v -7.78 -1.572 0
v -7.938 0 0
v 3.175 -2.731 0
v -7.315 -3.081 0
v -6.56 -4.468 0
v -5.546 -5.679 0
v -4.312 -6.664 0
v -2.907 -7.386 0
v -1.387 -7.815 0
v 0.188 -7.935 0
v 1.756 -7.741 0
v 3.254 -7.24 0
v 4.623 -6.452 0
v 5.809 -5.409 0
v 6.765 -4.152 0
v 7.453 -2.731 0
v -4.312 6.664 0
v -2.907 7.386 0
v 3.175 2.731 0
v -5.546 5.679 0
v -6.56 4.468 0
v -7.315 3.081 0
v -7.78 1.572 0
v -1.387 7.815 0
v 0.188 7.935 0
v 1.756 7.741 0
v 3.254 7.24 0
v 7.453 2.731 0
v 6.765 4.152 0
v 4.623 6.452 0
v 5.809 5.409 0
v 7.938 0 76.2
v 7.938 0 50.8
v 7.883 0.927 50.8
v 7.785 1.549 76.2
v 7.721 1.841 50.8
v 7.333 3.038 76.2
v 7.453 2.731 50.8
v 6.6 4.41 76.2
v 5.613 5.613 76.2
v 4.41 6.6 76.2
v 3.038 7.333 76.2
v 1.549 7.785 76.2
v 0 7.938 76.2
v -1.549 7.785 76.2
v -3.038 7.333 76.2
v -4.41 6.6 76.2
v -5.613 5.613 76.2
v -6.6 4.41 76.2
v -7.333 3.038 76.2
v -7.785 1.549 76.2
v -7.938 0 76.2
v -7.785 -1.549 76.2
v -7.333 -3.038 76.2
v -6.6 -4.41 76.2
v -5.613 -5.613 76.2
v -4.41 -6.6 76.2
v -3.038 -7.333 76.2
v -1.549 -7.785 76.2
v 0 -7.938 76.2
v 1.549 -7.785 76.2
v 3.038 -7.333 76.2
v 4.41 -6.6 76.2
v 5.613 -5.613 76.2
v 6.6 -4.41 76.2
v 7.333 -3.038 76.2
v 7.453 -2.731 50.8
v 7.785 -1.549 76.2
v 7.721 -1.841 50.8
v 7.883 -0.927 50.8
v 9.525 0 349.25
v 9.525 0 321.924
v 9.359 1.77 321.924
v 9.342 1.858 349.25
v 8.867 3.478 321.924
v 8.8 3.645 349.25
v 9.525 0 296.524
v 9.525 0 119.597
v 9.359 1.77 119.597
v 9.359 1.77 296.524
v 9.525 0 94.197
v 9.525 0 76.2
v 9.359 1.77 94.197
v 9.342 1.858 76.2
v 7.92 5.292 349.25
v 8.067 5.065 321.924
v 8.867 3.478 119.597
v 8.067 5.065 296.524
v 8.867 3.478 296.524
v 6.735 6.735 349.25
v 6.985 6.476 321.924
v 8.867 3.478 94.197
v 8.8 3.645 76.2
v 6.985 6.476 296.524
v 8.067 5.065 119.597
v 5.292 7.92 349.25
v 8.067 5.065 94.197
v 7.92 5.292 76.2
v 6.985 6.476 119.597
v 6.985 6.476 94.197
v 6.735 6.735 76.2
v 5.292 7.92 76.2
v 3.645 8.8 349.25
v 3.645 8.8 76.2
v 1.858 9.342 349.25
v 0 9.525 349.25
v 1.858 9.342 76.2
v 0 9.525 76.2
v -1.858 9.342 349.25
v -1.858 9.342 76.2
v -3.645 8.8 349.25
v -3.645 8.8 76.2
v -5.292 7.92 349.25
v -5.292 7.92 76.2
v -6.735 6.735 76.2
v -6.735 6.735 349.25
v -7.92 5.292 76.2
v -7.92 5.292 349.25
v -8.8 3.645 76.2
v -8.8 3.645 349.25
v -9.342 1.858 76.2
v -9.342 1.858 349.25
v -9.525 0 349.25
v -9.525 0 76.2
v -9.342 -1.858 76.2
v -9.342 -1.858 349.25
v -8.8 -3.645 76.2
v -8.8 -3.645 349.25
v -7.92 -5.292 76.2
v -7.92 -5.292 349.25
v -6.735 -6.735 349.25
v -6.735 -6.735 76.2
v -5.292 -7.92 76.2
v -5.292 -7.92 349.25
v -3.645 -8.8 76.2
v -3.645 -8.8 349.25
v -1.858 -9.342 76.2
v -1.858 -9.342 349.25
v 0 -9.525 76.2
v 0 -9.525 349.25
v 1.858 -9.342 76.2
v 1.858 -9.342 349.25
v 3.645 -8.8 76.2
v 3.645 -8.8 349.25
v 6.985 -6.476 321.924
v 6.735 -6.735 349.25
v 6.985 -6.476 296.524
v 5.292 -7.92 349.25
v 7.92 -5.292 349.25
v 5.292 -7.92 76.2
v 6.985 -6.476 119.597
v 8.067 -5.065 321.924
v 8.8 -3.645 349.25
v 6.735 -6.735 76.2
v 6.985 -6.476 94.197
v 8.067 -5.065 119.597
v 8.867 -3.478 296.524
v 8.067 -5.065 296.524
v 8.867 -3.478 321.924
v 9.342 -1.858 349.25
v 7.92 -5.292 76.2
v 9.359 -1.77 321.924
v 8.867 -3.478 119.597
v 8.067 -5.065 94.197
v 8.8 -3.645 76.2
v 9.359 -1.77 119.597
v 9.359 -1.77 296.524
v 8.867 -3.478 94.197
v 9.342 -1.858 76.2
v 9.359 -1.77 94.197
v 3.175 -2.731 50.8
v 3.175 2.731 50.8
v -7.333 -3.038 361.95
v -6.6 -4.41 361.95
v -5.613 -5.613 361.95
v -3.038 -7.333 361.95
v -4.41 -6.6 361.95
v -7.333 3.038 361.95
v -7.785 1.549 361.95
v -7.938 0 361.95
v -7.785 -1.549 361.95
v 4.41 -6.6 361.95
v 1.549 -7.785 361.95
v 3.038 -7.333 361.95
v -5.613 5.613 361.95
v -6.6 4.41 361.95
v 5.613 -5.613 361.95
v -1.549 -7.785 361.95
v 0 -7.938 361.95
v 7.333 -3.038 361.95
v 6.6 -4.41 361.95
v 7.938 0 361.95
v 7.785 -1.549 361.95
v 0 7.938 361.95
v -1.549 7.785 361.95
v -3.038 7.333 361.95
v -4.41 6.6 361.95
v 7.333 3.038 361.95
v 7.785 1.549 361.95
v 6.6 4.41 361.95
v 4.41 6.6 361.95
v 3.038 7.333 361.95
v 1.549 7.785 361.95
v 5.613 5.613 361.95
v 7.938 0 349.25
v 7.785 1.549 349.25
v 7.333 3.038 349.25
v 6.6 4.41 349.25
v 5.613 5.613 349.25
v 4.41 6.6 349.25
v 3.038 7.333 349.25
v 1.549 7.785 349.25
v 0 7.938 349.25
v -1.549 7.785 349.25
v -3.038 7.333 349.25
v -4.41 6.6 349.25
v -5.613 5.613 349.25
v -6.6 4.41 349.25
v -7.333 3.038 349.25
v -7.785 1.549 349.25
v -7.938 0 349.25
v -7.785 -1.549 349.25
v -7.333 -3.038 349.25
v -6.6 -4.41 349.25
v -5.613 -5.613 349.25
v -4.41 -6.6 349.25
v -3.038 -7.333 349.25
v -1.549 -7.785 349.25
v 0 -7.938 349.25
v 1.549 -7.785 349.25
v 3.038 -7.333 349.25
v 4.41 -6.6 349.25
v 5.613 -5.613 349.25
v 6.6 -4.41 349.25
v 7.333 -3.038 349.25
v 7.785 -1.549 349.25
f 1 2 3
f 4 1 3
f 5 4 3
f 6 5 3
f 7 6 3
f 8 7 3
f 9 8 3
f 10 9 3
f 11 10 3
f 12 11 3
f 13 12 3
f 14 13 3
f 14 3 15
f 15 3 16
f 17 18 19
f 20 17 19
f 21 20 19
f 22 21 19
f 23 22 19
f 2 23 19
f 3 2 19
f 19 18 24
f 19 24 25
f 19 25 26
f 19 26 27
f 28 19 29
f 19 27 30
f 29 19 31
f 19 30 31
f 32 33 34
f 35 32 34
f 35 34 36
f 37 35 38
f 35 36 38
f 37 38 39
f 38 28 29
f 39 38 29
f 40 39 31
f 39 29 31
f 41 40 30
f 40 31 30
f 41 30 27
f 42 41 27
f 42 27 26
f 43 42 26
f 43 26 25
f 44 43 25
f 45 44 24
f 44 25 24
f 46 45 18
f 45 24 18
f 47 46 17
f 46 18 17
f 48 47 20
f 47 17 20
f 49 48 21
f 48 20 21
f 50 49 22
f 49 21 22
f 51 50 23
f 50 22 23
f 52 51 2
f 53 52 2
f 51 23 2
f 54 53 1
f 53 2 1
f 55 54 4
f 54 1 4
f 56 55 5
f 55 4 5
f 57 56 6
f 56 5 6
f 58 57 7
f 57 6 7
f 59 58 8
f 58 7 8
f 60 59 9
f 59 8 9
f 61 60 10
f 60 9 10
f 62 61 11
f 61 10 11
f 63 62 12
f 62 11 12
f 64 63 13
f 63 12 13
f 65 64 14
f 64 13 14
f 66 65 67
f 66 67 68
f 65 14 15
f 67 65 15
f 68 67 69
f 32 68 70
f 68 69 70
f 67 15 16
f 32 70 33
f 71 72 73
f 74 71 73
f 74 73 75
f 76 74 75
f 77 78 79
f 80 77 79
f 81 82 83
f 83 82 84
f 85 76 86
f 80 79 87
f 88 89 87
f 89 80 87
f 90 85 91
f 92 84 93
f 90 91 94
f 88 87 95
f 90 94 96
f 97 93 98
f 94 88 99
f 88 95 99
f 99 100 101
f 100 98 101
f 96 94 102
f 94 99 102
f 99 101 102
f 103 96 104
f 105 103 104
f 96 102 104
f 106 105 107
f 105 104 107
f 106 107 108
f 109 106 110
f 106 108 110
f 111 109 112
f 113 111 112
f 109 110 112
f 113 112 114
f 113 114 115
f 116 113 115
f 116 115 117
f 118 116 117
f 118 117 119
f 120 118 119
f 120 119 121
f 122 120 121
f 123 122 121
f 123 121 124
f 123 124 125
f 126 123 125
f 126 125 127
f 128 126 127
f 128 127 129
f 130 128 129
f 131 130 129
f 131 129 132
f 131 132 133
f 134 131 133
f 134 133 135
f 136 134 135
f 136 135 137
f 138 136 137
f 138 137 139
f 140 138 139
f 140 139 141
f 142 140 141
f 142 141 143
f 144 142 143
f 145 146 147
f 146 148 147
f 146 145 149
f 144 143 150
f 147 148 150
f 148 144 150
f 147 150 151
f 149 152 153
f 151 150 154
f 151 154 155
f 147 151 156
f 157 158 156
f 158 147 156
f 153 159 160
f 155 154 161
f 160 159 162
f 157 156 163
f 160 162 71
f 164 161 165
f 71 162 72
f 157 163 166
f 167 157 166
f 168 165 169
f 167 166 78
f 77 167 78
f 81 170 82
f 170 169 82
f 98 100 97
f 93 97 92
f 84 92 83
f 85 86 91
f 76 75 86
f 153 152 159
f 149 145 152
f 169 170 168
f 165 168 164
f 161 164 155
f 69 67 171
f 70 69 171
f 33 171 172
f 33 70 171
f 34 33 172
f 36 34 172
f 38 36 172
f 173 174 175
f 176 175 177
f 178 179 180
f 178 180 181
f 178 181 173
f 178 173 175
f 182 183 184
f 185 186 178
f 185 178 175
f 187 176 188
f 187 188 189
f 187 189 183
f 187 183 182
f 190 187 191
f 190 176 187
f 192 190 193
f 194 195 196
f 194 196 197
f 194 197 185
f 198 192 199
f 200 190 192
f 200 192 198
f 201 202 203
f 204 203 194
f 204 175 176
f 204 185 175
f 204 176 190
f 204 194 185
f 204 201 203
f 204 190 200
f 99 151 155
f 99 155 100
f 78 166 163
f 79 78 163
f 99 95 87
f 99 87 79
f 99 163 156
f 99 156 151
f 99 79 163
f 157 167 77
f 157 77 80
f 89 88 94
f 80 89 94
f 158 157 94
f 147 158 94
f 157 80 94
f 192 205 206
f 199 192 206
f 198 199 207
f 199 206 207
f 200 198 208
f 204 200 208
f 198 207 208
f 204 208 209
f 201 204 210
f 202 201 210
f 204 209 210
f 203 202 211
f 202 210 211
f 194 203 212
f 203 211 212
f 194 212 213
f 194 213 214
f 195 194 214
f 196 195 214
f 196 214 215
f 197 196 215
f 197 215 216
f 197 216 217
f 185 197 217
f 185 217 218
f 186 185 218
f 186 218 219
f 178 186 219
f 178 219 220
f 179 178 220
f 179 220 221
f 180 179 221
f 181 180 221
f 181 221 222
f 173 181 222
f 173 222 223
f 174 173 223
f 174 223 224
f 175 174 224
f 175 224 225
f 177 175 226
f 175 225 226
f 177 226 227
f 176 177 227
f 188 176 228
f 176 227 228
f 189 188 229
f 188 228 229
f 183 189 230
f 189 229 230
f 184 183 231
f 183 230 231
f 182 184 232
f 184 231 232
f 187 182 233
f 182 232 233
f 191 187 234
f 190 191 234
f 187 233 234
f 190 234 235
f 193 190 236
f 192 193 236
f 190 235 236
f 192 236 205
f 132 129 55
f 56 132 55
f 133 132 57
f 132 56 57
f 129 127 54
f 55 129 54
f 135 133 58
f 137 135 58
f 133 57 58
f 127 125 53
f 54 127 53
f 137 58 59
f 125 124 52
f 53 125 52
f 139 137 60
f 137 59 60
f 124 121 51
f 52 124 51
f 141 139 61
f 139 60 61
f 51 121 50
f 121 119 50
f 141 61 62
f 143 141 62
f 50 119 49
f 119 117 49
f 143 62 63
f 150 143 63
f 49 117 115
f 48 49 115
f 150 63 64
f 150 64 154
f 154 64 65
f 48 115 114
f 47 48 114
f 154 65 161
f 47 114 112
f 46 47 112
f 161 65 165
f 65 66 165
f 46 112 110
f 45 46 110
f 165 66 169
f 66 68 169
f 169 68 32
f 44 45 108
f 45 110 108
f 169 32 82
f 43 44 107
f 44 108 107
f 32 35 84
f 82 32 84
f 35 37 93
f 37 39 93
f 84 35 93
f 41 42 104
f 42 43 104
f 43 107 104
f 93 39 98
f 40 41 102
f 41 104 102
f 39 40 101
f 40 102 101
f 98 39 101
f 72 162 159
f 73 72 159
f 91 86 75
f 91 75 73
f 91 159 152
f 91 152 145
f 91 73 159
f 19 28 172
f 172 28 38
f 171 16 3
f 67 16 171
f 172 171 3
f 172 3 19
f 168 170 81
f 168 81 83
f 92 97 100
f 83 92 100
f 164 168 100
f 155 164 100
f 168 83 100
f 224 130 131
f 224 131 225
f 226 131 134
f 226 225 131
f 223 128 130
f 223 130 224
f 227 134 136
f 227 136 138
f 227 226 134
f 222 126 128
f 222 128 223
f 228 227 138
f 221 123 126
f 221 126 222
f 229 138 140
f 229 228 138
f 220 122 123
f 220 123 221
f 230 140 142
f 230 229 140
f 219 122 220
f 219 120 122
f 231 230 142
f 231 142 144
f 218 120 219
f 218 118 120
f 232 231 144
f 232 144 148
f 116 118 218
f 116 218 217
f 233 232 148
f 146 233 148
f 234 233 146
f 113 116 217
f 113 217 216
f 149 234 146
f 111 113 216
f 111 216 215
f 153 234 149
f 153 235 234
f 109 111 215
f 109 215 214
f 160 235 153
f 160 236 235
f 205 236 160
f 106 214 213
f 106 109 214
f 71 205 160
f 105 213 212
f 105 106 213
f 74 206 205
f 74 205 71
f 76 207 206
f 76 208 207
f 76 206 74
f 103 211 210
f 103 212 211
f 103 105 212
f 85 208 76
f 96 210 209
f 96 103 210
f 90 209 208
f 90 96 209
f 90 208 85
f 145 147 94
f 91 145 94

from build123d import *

# Parameters (mm, degrees)
F0_R     = 7.9375
F1_DEPTH = 361.95
F0_R_2   = 9.525
F2_DEPTH = 349.25
F3_DEPTH = 76.2
F5_W     = 5.461208
F5_H     = 50.8
F6_DEPTH = 4.7625
F8_W     = 25.4
F8_H     = 25.4
F9_DEPTH = 2.54


with BuildPart() as f1:
    # F0 (on Top) → F1 (new body)
    with BuildSketch(Plane.XY):
        Circle(F0_R)
    extrude(amount=F1_DEPTH)

    # F0 (on Top) → F2 (join)
    with BuildSketch(Plane.XY):
        Circle(F0_R_2)
        Circle(F0_R, mode=Mode.SUBTRACT)
    extrude(amount=F2_DEPTH)

    # F0 (on Top) → F3 (cut)
    with BuildSketch(Plane.XY):
        Circle(F0_R_2)
        Circle(F0_R, mode=Mode.SUBTRACT)
    extrude(amount=F3_DEPTH, mode=Mode.SUBTRACT)

    # F5 (on offset) → F6 (cut)
    with BuildSketch(Plane.YZ.offset(7.9375)):
        with Locations((0, 25.4)):
            Rectangle(F5_W, F5_H)
    extrude(amount=-F6_DEPTH, mode=Mode.SUBTRACT)

    # F8 (on offset) → F9 (cut)
    with BuildSketch(Plane.YZ.offset(9.525)):
        with Locations((0, 309.224188)):
            Rectangle(F8_W, F8_H)
        with Locations((0, 106.897242)):
            Rectangle(F8_W, F8_H)
    extrude(amount=-F9_DEPTH, mode=Mode.SUBTRACT)


solid = f1.part
